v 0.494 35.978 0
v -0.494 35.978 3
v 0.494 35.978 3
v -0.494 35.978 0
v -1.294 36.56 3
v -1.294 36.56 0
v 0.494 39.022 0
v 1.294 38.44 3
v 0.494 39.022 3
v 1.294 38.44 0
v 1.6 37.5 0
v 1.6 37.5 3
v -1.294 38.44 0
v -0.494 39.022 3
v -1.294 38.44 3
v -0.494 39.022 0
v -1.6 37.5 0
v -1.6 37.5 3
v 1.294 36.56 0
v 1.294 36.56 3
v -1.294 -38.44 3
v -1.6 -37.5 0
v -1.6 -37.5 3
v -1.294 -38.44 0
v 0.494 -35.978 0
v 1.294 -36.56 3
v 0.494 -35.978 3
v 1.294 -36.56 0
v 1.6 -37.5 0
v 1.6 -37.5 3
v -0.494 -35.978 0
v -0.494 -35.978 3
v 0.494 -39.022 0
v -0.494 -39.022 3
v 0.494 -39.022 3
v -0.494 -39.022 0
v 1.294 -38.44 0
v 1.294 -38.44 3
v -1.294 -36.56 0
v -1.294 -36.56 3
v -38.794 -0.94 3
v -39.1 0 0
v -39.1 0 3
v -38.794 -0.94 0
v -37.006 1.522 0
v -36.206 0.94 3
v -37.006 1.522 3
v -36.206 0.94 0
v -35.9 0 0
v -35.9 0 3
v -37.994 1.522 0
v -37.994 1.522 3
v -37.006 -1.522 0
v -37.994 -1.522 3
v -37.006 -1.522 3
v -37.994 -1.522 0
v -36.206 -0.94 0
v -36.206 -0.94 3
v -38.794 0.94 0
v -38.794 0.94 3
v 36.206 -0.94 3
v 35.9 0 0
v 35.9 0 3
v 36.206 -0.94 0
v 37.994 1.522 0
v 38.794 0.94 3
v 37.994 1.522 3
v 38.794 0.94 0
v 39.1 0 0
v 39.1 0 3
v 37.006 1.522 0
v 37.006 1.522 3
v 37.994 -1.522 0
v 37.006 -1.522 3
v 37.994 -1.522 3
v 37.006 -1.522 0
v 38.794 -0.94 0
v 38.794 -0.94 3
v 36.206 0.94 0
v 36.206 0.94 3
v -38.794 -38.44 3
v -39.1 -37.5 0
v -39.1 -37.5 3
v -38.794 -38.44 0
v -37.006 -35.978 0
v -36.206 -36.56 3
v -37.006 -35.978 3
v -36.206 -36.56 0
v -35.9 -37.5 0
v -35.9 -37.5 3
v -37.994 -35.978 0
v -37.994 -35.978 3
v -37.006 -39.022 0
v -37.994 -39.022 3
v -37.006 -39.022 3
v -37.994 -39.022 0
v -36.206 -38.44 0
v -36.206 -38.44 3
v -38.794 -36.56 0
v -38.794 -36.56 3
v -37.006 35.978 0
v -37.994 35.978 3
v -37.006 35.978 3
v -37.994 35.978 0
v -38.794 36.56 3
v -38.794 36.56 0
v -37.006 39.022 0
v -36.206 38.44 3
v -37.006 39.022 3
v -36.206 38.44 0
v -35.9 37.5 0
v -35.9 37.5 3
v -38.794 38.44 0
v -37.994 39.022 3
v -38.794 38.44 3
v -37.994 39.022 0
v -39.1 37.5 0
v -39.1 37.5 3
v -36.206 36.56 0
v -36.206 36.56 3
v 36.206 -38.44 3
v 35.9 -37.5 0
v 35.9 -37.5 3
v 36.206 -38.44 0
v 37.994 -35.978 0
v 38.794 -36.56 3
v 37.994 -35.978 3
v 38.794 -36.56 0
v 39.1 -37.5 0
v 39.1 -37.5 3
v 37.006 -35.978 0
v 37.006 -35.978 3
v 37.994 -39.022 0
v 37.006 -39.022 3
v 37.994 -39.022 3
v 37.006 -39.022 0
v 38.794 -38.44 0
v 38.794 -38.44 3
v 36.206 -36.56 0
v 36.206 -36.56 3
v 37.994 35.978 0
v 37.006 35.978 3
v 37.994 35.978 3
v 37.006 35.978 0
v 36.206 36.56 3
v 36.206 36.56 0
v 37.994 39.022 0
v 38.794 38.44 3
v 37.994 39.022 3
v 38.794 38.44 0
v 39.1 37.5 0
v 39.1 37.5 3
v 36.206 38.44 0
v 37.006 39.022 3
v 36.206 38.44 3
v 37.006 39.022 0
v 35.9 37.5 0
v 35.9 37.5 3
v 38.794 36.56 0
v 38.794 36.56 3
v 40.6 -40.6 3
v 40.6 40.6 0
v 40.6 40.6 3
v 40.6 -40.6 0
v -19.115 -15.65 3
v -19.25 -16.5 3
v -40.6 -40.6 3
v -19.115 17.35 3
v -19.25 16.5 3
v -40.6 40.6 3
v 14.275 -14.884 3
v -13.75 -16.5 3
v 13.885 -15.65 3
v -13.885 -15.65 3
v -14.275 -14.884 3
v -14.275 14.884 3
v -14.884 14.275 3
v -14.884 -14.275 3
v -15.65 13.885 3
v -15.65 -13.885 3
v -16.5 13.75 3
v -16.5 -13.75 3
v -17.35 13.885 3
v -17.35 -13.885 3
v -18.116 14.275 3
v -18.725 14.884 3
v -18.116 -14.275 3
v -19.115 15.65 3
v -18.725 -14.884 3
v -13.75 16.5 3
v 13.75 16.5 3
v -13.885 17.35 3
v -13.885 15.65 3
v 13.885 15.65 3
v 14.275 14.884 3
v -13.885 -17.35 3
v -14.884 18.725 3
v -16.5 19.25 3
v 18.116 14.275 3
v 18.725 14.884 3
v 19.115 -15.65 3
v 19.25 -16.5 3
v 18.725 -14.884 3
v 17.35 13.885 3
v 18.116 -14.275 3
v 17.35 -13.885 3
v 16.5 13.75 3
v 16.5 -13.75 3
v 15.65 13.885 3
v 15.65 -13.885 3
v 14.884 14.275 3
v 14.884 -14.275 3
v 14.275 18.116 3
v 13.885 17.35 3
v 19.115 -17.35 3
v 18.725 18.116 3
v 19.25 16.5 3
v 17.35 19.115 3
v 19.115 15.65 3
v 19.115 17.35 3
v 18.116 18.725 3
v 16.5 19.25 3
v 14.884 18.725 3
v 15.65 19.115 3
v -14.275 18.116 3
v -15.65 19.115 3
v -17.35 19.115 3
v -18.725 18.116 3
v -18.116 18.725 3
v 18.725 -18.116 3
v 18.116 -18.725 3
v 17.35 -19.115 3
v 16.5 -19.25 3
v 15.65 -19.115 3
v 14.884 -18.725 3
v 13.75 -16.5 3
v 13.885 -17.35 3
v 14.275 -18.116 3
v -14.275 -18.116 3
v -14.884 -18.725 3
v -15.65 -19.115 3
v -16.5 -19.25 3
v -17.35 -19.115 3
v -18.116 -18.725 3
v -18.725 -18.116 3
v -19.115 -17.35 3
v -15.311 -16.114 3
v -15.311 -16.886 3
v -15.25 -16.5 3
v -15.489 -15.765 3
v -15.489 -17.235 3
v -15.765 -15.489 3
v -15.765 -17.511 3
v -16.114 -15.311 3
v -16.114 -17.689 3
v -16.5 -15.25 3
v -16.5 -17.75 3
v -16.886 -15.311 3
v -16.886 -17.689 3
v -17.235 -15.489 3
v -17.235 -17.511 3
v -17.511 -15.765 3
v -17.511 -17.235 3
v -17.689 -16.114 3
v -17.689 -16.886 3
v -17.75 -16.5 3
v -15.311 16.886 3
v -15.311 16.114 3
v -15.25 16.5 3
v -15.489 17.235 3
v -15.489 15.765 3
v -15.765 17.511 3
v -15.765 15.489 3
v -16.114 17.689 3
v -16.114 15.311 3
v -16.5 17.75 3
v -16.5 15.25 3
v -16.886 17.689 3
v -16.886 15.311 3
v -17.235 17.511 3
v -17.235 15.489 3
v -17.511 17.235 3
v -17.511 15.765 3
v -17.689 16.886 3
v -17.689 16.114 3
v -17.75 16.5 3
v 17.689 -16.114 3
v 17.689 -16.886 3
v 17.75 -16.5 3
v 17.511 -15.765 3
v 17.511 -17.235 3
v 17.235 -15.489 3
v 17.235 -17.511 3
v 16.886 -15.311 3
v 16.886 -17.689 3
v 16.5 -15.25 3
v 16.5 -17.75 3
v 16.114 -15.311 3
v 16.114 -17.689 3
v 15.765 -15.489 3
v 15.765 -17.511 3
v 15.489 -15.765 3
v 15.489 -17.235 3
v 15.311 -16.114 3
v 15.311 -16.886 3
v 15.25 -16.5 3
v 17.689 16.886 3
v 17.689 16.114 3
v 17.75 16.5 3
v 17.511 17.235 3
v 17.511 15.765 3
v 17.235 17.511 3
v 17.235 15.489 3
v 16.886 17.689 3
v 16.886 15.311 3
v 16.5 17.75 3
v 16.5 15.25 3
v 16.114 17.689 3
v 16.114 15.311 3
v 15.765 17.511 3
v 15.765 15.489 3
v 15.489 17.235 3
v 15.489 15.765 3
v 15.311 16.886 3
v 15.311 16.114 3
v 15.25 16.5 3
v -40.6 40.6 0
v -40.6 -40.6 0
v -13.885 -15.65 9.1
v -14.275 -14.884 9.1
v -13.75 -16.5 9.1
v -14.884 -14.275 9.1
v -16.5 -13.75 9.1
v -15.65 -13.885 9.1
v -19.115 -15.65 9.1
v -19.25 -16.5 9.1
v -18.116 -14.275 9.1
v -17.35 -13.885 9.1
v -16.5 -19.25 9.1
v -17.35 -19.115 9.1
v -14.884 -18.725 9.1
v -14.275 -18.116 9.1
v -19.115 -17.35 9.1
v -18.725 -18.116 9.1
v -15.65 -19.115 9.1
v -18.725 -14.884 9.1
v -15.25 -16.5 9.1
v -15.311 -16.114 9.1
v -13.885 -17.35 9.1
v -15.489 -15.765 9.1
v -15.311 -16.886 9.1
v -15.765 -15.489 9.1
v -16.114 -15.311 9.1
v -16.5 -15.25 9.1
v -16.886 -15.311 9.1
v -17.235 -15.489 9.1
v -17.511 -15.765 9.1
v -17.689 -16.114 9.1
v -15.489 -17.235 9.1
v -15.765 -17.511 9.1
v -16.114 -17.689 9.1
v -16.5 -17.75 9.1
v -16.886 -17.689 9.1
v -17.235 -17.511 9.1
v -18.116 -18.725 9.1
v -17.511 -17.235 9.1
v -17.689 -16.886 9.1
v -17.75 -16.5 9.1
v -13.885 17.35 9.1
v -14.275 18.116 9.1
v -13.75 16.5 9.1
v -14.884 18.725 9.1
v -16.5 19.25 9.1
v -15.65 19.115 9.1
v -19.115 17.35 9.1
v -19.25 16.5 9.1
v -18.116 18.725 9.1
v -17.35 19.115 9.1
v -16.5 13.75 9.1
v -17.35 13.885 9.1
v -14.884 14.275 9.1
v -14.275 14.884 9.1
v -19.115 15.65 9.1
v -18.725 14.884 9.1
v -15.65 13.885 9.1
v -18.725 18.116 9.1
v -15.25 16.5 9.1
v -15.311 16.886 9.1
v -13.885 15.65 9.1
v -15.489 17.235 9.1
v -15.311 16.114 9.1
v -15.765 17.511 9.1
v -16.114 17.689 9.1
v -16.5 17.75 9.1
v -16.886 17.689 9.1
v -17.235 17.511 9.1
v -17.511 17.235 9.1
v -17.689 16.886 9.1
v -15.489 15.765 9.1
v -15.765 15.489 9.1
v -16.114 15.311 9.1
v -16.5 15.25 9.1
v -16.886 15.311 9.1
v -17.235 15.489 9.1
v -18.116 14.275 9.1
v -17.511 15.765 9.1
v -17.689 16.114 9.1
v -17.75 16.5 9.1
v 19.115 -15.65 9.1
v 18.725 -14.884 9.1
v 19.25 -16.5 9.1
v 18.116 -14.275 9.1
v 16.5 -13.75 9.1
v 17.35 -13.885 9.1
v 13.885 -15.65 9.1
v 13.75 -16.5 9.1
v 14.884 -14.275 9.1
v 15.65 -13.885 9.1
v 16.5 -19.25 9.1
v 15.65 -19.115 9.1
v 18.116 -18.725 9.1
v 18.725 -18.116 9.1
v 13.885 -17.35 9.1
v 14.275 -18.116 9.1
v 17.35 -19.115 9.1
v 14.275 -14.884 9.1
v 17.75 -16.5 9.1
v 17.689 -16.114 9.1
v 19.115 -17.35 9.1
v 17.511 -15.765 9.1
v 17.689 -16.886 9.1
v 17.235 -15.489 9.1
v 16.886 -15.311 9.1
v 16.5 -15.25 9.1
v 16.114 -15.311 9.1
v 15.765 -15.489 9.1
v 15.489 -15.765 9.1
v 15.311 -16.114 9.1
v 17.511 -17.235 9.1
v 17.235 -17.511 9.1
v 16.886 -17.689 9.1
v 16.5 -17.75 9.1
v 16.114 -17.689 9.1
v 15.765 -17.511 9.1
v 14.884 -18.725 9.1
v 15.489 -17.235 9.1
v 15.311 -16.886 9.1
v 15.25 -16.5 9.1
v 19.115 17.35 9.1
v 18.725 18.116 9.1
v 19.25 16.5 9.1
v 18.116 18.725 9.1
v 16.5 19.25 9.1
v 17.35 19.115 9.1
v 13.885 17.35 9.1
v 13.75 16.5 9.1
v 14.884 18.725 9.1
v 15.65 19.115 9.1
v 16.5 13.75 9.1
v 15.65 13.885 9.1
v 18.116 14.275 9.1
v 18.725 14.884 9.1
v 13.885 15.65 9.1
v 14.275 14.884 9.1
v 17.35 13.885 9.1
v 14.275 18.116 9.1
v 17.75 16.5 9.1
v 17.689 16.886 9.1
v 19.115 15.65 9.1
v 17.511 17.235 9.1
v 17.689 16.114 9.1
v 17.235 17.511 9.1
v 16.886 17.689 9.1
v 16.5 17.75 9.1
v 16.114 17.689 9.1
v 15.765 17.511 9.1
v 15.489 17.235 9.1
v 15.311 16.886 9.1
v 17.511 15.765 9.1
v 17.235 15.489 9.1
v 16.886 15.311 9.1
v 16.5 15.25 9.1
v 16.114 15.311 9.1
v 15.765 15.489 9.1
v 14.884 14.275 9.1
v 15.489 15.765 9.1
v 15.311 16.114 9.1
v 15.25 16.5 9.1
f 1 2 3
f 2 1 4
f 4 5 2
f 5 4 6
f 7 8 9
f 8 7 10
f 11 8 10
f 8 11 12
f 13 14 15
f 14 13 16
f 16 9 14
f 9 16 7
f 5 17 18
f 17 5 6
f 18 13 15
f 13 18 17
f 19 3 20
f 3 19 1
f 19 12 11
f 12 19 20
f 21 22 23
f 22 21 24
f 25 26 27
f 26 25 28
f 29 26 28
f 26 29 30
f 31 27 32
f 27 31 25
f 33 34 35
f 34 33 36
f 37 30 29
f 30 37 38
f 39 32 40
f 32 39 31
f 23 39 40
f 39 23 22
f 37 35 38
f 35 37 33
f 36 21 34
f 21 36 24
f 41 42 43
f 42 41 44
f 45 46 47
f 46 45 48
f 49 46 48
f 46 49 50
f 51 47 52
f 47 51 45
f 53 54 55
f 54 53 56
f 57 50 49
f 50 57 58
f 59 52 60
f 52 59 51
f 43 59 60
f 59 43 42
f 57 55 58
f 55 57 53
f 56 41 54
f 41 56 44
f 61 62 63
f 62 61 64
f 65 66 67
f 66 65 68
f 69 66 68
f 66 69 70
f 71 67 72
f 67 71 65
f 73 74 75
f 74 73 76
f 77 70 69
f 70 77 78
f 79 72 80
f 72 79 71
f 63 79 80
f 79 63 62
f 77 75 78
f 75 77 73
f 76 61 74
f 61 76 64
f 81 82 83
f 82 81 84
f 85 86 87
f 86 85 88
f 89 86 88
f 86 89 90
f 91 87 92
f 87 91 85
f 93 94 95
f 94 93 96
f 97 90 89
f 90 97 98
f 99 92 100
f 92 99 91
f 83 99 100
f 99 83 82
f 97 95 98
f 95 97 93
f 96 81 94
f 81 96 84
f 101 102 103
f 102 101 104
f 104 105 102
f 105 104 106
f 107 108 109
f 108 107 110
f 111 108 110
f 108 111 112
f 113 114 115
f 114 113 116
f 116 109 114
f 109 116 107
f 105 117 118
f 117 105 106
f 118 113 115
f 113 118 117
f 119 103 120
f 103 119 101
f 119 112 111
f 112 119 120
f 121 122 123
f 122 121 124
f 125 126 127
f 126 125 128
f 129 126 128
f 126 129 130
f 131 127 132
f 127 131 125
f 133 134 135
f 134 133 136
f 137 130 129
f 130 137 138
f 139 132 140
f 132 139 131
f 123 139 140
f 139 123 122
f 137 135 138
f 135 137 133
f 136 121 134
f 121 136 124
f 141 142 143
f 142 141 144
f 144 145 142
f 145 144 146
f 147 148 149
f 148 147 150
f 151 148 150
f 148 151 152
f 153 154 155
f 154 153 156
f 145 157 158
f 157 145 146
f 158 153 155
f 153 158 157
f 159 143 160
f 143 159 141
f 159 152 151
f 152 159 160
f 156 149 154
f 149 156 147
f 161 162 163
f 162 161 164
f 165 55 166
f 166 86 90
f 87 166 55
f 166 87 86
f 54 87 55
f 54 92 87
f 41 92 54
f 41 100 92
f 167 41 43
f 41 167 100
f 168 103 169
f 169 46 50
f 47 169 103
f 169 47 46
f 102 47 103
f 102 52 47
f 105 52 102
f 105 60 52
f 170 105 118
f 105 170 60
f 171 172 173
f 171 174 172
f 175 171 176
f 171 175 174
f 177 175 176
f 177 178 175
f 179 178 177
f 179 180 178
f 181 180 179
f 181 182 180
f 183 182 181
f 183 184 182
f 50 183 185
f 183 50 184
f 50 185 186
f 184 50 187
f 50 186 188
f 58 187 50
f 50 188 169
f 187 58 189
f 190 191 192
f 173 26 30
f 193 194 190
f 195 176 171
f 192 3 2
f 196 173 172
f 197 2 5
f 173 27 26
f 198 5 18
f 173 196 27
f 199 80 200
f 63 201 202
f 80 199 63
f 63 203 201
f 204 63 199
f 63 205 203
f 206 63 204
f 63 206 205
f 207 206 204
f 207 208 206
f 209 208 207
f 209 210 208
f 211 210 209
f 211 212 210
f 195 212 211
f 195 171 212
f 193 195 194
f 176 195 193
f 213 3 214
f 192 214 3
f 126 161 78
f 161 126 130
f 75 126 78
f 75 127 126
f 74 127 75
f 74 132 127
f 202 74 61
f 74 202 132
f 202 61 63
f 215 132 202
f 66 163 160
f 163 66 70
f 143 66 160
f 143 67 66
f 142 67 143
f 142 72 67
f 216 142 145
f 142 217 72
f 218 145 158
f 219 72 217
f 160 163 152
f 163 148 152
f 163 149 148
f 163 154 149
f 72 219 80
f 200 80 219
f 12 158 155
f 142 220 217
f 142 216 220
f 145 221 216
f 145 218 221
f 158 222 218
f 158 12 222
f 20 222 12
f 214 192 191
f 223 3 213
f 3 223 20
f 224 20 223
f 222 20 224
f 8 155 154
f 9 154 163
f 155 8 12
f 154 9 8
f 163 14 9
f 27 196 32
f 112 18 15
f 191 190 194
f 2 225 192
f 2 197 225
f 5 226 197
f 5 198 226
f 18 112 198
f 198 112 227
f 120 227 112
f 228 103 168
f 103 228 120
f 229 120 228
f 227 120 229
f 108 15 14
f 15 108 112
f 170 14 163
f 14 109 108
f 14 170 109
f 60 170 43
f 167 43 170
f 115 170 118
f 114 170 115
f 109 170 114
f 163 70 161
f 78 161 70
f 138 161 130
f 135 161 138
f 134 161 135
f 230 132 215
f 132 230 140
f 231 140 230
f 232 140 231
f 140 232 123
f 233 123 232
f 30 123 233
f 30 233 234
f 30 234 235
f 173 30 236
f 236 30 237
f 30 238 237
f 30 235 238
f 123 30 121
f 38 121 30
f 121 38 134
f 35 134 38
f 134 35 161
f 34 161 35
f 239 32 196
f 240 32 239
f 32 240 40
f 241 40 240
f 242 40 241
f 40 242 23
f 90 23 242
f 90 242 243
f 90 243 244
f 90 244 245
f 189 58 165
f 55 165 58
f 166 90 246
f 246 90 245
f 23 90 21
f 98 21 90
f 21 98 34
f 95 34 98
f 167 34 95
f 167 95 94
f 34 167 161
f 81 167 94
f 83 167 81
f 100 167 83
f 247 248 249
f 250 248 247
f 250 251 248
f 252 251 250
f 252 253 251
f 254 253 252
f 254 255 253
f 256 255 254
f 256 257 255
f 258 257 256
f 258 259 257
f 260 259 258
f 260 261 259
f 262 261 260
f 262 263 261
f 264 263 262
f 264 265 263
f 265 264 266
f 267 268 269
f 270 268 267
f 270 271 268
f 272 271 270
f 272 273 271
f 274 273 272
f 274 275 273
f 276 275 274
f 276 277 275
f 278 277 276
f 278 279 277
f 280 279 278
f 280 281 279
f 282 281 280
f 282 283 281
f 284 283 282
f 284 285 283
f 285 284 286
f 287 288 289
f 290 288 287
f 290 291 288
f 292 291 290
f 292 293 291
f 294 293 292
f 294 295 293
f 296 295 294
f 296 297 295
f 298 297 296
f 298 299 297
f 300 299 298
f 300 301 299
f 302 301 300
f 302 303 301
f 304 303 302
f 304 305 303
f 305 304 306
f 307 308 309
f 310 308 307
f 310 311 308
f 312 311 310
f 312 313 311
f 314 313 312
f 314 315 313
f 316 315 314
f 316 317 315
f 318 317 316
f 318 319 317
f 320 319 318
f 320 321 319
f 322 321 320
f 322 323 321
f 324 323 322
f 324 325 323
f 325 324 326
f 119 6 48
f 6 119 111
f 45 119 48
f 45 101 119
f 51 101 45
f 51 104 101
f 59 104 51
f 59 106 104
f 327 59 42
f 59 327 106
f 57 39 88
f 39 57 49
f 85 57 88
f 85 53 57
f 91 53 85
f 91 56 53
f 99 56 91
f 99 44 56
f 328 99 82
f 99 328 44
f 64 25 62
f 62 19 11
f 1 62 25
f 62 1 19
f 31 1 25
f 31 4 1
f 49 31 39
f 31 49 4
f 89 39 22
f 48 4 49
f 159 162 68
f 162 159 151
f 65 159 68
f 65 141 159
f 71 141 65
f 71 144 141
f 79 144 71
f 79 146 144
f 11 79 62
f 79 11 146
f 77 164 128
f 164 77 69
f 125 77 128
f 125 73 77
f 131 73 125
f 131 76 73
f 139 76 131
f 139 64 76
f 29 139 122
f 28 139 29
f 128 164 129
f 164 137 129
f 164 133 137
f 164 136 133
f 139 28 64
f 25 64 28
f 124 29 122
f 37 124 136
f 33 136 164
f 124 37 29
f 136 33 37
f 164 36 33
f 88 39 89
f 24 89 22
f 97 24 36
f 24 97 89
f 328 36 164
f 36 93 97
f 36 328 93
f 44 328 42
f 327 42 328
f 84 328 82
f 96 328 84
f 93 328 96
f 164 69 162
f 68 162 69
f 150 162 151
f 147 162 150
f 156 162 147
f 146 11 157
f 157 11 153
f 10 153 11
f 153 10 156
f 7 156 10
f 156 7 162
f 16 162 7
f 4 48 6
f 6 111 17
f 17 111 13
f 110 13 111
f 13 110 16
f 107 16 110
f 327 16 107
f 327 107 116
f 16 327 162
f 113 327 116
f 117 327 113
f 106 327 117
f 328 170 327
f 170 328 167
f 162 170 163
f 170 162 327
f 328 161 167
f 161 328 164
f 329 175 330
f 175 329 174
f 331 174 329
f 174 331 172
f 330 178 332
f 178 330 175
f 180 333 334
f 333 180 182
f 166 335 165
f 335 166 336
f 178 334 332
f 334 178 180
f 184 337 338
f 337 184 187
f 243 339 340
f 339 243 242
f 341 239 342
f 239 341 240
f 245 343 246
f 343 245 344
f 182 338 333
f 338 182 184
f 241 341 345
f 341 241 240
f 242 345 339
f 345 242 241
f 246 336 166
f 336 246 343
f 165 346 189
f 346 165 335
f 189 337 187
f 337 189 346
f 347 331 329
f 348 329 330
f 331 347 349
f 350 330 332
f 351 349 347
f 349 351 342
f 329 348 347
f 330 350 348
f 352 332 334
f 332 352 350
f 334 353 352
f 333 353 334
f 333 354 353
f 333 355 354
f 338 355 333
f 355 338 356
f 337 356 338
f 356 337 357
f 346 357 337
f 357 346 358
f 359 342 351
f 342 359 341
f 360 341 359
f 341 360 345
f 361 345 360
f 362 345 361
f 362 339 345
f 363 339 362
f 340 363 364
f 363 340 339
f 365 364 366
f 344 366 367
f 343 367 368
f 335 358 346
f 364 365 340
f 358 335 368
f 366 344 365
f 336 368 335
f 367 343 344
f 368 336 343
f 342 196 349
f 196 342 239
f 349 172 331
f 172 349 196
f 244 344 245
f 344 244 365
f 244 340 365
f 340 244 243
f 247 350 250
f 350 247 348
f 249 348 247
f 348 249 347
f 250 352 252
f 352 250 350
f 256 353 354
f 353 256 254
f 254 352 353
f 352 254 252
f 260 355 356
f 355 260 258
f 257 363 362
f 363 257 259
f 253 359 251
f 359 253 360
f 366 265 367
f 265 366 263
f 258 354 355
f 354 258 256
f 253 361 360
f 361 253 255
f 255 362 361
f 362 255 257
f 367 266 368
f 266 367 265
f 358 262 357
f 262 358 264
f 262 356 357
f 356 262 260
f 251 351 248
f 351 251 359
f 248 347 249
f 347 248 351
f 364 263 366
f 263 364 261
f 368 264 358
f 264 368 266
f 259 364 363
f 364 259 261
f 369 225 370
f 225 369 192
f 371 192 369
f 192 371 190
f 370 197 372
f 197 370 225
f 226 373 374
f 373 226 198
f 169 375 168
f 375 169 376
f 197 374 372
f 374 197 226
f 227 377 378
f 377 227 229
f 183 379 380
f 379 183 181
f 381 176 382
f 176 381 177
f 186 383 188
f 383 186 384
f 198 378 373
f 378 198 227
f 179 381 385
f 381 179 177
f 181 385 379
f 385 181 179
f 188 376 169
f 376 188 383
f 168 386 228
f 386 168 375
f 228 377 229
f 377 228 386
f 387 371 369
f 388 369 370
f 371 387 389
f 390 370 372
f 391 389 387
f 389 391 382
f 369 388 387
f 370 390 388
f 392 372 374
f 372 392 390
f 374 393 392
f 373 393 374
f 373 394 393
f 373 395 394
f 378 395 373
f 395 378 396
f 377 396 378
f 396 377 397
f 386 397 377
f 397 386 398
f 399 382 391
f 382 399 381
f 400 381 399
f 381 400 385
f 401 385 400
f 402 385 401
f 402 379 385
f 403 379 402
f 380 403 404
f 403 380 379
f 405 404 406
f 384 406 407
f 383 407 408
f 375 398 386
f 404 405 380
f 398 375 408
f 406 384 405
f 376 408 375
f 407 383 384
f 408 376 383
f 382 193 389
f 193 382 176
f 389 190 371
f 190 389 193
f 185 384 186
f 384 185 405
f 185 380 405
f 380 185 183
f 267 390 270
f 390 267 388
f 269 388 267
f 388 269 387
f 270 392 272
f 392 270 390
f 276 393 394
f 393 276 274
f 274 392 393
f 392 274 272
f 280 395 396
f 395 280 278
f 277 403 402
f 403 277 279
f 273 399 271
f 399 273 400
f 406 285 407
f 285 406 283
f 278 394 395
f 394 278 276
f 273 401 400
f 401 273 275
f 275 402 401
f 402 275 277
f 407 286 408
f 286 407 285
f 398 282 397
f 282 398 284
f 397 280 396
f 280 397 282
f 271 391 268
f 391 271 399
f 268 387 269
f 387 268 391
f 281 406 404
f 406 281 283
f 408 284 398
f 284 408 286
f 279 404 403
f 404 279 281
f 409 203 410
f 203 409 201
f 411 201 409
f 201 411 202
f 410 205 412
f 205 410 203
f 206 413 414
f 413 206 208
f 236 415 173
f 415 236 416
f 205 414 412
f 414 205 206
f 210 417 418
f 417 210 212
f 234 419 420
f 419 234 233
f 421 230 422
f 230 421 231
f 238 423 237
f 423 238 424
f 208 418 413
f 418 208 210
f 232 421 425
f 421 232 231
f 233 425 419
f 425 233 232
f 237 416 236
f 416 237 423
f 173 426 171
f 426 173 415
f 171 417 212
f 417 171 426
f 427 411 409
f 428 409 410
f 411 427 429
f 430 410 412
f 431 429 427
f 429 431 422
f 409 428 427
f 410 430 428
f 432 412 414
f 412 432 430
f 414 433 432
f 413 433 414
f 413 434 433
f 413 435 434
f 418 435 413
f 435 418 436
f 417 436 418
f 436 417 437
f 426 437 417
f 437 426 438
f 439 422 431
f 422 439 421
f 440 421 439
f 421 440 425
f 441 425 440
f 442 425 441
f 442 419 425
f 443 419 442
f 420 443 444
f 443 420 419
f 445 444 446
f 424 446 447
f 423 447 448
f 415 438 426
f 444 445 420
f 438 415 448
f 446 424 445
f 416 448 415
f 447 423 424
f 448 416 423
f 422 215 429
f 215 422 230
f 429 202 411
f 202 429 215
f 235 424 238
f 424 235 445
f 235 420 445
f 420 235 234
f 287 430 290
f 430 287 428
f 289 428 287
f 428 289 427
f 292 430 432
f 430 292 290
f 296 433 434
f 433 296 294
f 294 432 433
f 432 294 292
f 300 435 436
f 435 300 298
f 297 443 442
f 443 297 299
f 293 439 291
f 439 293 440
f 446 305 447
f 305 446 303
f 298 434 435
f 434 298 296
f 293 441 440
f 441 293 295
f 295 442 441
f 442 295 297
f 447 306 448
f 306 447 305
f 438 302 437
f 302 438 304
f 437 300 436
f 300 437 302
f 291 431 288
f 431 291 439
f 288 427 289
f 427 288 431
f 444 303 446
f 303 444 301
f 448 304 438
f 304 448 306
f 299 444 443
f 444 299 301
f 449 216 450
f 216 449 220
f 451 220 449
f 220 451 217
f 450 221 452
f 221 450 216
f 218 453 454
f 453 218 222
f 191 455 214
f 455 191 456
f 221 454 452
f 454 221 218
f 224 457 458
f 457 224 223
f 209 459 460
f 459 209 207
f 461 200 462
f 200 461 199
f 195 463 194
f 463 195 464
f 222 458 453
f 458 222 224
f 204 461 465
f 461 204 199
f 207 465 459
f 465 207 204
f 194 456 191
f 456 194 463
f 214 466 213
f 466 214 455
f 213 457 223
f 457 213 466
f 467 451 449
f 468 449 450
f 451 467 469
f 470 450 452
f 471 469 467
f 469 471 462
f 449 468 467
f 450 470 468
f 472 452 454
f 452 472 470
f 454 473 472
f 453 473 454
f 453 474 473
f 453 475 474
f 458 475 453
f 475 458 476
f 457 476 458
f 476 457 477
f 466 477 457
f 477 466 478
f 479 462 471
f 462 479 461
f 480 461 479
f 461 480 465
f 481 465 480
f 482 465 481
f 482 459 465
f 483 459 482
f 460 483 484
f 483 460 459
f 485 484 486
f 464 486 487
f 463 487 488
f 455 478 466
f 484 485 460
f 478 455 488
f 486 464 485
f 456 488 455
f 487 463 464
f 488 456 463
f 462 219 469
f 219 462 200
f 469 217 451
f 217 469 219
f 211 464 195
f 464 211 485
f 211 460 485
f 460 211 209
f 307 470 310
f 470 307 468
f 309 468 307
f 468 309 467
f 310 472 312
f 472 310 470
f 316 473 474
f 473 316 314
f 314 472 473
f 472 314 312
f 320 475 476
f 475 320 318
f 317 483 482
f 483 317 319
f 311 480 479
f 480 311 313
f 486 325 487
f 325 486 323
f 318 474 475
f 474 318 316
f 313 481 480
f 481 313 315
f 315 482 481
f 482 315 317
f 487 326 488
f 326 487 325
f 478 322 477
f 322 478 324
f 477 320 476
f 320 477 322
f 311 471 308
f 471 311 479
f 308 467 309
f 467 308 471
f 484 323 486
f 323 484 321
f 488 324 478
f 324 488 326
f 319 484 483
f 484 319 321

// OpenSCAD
//Multirotor plate customizer V0.1.3 by eriqjo
//
//v0.2.1 6/4/2014	Major bug fix for standoffs and holes not rendering correctly
//v0.2.0 5/26/2014	Added more clearance between slots and mounting holes
//					Added KK2 Mounting feature
//					Shortened radio supports to minimize plug interference
//					Added custom plate features
//v0.1.2 5/25/2014	Improved resolution for holes
//					Added option for control board mount
//v0.1.1 5/24/2014	Initial release of project
//

//CUSTOMIZER VARIABLES

/* [Plate Dimensions] */

//Choose predefined platform, or custom
Multirotor_Platform = 3; // [1:Arducopter, 3:Custom]

//Choose type of plate to create
Plate_Type = 2; // [1:Radio,2:Control Board,3:Slotted,4:Custom Plate]

//Choose how thick to make the plate, mm
Plate_Thickness = 3; // [1:6]

Mounting_Bolt_Size = 3.2; // [2.2:M2,3.2:M3,4.2:M4,5.2:M5,6.2:M6]

//Center-to-center distance of adjacent mounting holes (custom only), mm
X_and_Y_Distance = 75; //

//Add a hole in the middle?
Additional_Hole = "Yes"; // [Yes,No] 

/* [Radio Plate] */

//How wide (y) is your radio RX, mm?
Radio_Width = 34.5;

//How long (x) is your radio RX, mm?
Radio_Length = 52;

//How many cable-ties to hold the radio down?
Cable_Tie_Ct = 2; // [0:3]

//How wide are your cable-ties, mm?
Cable_Tie_Width = 4;

//How tall do you want the supports, mm?
Support_Height = 5;

/* [Control plate] */

Control_Board = 2; // [1:KK2,2:Custom]

//Center-to-center distance in X-direction (custom only), mm
Control_Board_X = 33;

//Center-to-center distance in Y-direction (custom only), mm
Control_Board_Y = 33;

//How tall to make standoffs
Standoff_Height = 6;

//What size bolt to attach board (custom only)
Control_Board_Bolt = 2.5; // [1.6:M2,2.05:M2.5,2.5:M3,3.5:M4,4.5:M5]

/* [Slotted Plate] */

//How wide do you want the slots, mm?
Slot_Width = 3; // [1:5]

//Note: Too many wide slots will intersect.
Number_of_Slots = 11;

Profile = 1; // [1:Rounded,2:Square]

/* [Custom Plate] */

//Size of holes, mm 
Hole_Diameter = 3;

//Matrix of hole coordinates, ex: [[1,2], [2,3]]
Hole_Matrix = [[-22, -22], [-22, 22], [22, -22], [22, 22]];

//Hole diameter inside standoffs, mm
Standoff_Hole_D = 2.5;

//How tall to make the standoffs, mm
Custom_Standoff_Height = 6;

//Matrix of standoff coordinates, ex: [[1,2], [2,3]]
Standoff_Matrix = [[-15, -15], [-15, 15], [15, -15], [15, 15]];

//CUSTOMIZER VARIABLES END

/* [Hidden] */

Support_Width = 4; // How wide the radio structure will be

Support_Length = 4; // How long the corners are

Radio_Dim_Margin = 0.3; // Makes the holder a little bit bigger than measured so there is no interference

AntiCoPlanar = 0.2; // Make things bigger by this much so there are not ambiguous faces

Safety_Perimeter = 3; // Distance between the bolt hole and the edge of the plate

//***************************************************

module makeBase(){

	q = X_and_Y_Distance;

	if (Multirotor_Platform == 1){
		difference(){
			baseExtrude(68.25);
			baseHoles(68.25);
		}
	}

	if (Multirotor_Platform == 2){
		difference(){
			baseExtrude(q);
			baseHoles(q);
		}
	}

	if (Multirotor_Platform == 3){
		difference(){
			baseExtrude(q);
			baseHoles(q);
		}
	}

}

//***************************************************

module makeCustomPlate(){

	difference(){
		union(){
			addStandOffs(Standoff_Matrix, Standoff_Hole_D, Custom_Standoff_Height);
			makeBase();
		}	
		addHoles(Hole_Matrix, Hole_Diameter);
	}
}

//***************************************************

module makeSlots(dist){

	availableXY = dist - 2*Safety_Perimeter - Mounting_Bolt_Size;
	supportX = (availableXY - (Number_of_Slots * Slot_Width))/(Number_of_Slots - 1);
	echo(supportX);
	offset = supportX + Slot_Width;

	translate([-availableXY/2 + Slot_Width/2, 0, 0])
	for (i = [0:Number_of_Slots-1]){
		if (Profile == 1){
			translate([i * offset, 0, 0]){
				union(){
					cube([Slot_Width, availableXY - Slot_Width, 2*Plate_Thickness], center = true);
					translate([0, (availableXY - Slot_Width)/2, 0])	{
						cylinder(h = 2*Plate_Thickness, r = Slot_Width/2, center = true);
					}
					translate([0, -(availableXY - Slot_Width)/2, 0]){
						cylinder(h = 2*Plate_Thickness, r = Slot_Width/2, center = true);
					}
				}
			}
		}
		if (Profile == 2){
			translate([i * offset, 0, 0]){
				cube([Slot_Width, availableXY, 2*Plate_Thickness], center = true);
			}
		}
	}

}

//***************************************************

module radioSupport(){

	translate([0, 0, Support_Height/2 + Plate_Thickness/2]){
		difference(){
			cube([Radio_Length + Support_Width, Radio_Width + Support_Width, Support_Height + AntiCoPlanar], center = true);
			cube([Radio_Length + Radio_Dim_Margin, Radio_Width + Radio_Dim_Margin, Support_Height + 2*AntiCoPlanar], center = true);
			cube([Radio_Length + 2*Support_Width + AntiCoPlanar, Radio_Width - 2*Support_Length, Support_Height + 2*AntiCoPlanar], center = true);
			cube([Radio_Length - 2*Support_Length, Radio_Width + 2*Support_Width + AntiCoPlanar, Support_Height + 2*AntiCoPlanar], center = true);
		}		
	}
}

//***************************************************

module makeControlBoardPlate(){

	customX = Control_Board_X/2;
	customY = Control_Board_Y/2;

	if (Control_Board == 1){
		union(){
			makeBase();
			addStandOffs([[-22,-22],[-22,22],[22,-22],[22,22]], 2.5, Standoff_Height);			
		}
	}

	if (Control_Board == 2){
		union(){
			makeBase();
			addStandOffs([[-customX,-customY],[-customX,customY],[customX,-customY],[customX,customY]], Control_Board_Bolt, Standoff_Height);
		}
	}

}

//***************************************************

module makeRadioPlate(){

	union(){
		difference(){
			makeBase();
			cableTieHoles();
		}
		radioSupport();
	}

}

//***************************************************

module makeSlotPlate(s){

	difference(){
		makeBase();
		makeSlots(s);
	}

}

//***************************************************

module baseExtrude(Hole_Spacing){

	Square_Dims = Hole_Spacing + Mounting_Bolt_Size + Safety_Perimeter;
	cube([Square_Dims, Square_Dims, Plate_Thickness], center = true);
	
}

//****************************************************

module addStandOffs(location, diameter, height){

	for (i = location){
		translate([i[0], i[1], Plate_Thickness/2 + height/2])
		difference(){
			cylinder(h = height + AntiCoPlanar, r = (diameter + 3)/2, center = true, $fn = 20);
			cylinder(h = height + 2*AntiCoPlanar, r = diameter/2, center = true, $fn = 20);
		}
	}

}

//****************************************************

module cableTieHoles(){

	Hole_Y_Top = Radio_Width/2 + Support_Width + Cable_Tie_Width/2;
	Hole_Y_Bottom = -Hole_Y_Top; 

	if (Cable_Tie_Ct == 0) {  }  //Do nothing

	if (Cable_Tie_Ct == 1) {
		addHoles([[0,Hole_Y_Top],[0, Hole_Y_Bottom]], Cable_Tie_Width);
	}

	if (Cable_Tie_Ct == 2) {
		addHoles([[-0.25*Radio_Length, Hole_Y_Top], [0.25*Radio_Length, Hole_Y_Top],
			[-0.25*Radio_Length, Hole_Y_Bottom], [0.25*Radio_Length, Hole_Y_Bottom]], Cable_Tie_Width);
	}

	if (Cable_Tie_Ct == 3) {
		addHoles([[-0.4*Radio_Length, Hole_Y_Top], [0.4*Radio_Length, Hole_Y_Top],
			[0, Hole_Y_Top], [0, Hole_Y_Bottom],
			[-0.4*Radio_Length, Hole_Y_Bottom], [0.4*Radio_Length, Hole_Y_Bottom]], Cable_Tie_Width);
	}

}

//****************************************************

module baseHoles(xyDim){

	if (Additional_Hole == "Yes"){
		addHoles([[0, xyDim/2], [0, -xyDim/2],
			[-xyDim/2, 0], [xyDim/2, 0]], Mounting_Bolt_Size);
	}

	addHoles([[-xyDim/2, -xyDim/2], [-xyDim/2, xyDim/2],
		[xyDim/2, -xyDim/2], [xyDim/2, xyDim/2]], Mounting_Bolt_Size);

}

//****************************************************

module addHoles(pos, dia){		//Add hole at [x, y, d]

	for (i = pos){
		translate([i[0], i[1], 0]) cylinder(h = 2*(Plate_Thickness + Support_Height), r = dia/2, center = true, $fn = 10);
	}

}

//*****************************************************

//Here is the runtime stuff

if (Plate_Type == 1) {
	translate([0, 0, Plate_Thickness/2]) makeRadioPlate();
}

if (Plate_Type == 2) {
	translate([0, 0, Plate_Thickness/2]) makeControlBoardPlate();
}

if (Plate_Type == 3) {
	translate([0, 0, Plate_Thickness/2])
	if (Multirotor_Platform == 1){
		makeSlotPlate(68.25);
	}

	translate([0, 0, Plate_Thickness/2])
	if (Multirotor_Platform == 3){
		makeSlotPlate(X_and_Y_Distance);
	}

}

if (Plate_Type == 4){
	translate([0, 0, Plate_Thickness/2]){
		makeCustomPlate();
	}
}
